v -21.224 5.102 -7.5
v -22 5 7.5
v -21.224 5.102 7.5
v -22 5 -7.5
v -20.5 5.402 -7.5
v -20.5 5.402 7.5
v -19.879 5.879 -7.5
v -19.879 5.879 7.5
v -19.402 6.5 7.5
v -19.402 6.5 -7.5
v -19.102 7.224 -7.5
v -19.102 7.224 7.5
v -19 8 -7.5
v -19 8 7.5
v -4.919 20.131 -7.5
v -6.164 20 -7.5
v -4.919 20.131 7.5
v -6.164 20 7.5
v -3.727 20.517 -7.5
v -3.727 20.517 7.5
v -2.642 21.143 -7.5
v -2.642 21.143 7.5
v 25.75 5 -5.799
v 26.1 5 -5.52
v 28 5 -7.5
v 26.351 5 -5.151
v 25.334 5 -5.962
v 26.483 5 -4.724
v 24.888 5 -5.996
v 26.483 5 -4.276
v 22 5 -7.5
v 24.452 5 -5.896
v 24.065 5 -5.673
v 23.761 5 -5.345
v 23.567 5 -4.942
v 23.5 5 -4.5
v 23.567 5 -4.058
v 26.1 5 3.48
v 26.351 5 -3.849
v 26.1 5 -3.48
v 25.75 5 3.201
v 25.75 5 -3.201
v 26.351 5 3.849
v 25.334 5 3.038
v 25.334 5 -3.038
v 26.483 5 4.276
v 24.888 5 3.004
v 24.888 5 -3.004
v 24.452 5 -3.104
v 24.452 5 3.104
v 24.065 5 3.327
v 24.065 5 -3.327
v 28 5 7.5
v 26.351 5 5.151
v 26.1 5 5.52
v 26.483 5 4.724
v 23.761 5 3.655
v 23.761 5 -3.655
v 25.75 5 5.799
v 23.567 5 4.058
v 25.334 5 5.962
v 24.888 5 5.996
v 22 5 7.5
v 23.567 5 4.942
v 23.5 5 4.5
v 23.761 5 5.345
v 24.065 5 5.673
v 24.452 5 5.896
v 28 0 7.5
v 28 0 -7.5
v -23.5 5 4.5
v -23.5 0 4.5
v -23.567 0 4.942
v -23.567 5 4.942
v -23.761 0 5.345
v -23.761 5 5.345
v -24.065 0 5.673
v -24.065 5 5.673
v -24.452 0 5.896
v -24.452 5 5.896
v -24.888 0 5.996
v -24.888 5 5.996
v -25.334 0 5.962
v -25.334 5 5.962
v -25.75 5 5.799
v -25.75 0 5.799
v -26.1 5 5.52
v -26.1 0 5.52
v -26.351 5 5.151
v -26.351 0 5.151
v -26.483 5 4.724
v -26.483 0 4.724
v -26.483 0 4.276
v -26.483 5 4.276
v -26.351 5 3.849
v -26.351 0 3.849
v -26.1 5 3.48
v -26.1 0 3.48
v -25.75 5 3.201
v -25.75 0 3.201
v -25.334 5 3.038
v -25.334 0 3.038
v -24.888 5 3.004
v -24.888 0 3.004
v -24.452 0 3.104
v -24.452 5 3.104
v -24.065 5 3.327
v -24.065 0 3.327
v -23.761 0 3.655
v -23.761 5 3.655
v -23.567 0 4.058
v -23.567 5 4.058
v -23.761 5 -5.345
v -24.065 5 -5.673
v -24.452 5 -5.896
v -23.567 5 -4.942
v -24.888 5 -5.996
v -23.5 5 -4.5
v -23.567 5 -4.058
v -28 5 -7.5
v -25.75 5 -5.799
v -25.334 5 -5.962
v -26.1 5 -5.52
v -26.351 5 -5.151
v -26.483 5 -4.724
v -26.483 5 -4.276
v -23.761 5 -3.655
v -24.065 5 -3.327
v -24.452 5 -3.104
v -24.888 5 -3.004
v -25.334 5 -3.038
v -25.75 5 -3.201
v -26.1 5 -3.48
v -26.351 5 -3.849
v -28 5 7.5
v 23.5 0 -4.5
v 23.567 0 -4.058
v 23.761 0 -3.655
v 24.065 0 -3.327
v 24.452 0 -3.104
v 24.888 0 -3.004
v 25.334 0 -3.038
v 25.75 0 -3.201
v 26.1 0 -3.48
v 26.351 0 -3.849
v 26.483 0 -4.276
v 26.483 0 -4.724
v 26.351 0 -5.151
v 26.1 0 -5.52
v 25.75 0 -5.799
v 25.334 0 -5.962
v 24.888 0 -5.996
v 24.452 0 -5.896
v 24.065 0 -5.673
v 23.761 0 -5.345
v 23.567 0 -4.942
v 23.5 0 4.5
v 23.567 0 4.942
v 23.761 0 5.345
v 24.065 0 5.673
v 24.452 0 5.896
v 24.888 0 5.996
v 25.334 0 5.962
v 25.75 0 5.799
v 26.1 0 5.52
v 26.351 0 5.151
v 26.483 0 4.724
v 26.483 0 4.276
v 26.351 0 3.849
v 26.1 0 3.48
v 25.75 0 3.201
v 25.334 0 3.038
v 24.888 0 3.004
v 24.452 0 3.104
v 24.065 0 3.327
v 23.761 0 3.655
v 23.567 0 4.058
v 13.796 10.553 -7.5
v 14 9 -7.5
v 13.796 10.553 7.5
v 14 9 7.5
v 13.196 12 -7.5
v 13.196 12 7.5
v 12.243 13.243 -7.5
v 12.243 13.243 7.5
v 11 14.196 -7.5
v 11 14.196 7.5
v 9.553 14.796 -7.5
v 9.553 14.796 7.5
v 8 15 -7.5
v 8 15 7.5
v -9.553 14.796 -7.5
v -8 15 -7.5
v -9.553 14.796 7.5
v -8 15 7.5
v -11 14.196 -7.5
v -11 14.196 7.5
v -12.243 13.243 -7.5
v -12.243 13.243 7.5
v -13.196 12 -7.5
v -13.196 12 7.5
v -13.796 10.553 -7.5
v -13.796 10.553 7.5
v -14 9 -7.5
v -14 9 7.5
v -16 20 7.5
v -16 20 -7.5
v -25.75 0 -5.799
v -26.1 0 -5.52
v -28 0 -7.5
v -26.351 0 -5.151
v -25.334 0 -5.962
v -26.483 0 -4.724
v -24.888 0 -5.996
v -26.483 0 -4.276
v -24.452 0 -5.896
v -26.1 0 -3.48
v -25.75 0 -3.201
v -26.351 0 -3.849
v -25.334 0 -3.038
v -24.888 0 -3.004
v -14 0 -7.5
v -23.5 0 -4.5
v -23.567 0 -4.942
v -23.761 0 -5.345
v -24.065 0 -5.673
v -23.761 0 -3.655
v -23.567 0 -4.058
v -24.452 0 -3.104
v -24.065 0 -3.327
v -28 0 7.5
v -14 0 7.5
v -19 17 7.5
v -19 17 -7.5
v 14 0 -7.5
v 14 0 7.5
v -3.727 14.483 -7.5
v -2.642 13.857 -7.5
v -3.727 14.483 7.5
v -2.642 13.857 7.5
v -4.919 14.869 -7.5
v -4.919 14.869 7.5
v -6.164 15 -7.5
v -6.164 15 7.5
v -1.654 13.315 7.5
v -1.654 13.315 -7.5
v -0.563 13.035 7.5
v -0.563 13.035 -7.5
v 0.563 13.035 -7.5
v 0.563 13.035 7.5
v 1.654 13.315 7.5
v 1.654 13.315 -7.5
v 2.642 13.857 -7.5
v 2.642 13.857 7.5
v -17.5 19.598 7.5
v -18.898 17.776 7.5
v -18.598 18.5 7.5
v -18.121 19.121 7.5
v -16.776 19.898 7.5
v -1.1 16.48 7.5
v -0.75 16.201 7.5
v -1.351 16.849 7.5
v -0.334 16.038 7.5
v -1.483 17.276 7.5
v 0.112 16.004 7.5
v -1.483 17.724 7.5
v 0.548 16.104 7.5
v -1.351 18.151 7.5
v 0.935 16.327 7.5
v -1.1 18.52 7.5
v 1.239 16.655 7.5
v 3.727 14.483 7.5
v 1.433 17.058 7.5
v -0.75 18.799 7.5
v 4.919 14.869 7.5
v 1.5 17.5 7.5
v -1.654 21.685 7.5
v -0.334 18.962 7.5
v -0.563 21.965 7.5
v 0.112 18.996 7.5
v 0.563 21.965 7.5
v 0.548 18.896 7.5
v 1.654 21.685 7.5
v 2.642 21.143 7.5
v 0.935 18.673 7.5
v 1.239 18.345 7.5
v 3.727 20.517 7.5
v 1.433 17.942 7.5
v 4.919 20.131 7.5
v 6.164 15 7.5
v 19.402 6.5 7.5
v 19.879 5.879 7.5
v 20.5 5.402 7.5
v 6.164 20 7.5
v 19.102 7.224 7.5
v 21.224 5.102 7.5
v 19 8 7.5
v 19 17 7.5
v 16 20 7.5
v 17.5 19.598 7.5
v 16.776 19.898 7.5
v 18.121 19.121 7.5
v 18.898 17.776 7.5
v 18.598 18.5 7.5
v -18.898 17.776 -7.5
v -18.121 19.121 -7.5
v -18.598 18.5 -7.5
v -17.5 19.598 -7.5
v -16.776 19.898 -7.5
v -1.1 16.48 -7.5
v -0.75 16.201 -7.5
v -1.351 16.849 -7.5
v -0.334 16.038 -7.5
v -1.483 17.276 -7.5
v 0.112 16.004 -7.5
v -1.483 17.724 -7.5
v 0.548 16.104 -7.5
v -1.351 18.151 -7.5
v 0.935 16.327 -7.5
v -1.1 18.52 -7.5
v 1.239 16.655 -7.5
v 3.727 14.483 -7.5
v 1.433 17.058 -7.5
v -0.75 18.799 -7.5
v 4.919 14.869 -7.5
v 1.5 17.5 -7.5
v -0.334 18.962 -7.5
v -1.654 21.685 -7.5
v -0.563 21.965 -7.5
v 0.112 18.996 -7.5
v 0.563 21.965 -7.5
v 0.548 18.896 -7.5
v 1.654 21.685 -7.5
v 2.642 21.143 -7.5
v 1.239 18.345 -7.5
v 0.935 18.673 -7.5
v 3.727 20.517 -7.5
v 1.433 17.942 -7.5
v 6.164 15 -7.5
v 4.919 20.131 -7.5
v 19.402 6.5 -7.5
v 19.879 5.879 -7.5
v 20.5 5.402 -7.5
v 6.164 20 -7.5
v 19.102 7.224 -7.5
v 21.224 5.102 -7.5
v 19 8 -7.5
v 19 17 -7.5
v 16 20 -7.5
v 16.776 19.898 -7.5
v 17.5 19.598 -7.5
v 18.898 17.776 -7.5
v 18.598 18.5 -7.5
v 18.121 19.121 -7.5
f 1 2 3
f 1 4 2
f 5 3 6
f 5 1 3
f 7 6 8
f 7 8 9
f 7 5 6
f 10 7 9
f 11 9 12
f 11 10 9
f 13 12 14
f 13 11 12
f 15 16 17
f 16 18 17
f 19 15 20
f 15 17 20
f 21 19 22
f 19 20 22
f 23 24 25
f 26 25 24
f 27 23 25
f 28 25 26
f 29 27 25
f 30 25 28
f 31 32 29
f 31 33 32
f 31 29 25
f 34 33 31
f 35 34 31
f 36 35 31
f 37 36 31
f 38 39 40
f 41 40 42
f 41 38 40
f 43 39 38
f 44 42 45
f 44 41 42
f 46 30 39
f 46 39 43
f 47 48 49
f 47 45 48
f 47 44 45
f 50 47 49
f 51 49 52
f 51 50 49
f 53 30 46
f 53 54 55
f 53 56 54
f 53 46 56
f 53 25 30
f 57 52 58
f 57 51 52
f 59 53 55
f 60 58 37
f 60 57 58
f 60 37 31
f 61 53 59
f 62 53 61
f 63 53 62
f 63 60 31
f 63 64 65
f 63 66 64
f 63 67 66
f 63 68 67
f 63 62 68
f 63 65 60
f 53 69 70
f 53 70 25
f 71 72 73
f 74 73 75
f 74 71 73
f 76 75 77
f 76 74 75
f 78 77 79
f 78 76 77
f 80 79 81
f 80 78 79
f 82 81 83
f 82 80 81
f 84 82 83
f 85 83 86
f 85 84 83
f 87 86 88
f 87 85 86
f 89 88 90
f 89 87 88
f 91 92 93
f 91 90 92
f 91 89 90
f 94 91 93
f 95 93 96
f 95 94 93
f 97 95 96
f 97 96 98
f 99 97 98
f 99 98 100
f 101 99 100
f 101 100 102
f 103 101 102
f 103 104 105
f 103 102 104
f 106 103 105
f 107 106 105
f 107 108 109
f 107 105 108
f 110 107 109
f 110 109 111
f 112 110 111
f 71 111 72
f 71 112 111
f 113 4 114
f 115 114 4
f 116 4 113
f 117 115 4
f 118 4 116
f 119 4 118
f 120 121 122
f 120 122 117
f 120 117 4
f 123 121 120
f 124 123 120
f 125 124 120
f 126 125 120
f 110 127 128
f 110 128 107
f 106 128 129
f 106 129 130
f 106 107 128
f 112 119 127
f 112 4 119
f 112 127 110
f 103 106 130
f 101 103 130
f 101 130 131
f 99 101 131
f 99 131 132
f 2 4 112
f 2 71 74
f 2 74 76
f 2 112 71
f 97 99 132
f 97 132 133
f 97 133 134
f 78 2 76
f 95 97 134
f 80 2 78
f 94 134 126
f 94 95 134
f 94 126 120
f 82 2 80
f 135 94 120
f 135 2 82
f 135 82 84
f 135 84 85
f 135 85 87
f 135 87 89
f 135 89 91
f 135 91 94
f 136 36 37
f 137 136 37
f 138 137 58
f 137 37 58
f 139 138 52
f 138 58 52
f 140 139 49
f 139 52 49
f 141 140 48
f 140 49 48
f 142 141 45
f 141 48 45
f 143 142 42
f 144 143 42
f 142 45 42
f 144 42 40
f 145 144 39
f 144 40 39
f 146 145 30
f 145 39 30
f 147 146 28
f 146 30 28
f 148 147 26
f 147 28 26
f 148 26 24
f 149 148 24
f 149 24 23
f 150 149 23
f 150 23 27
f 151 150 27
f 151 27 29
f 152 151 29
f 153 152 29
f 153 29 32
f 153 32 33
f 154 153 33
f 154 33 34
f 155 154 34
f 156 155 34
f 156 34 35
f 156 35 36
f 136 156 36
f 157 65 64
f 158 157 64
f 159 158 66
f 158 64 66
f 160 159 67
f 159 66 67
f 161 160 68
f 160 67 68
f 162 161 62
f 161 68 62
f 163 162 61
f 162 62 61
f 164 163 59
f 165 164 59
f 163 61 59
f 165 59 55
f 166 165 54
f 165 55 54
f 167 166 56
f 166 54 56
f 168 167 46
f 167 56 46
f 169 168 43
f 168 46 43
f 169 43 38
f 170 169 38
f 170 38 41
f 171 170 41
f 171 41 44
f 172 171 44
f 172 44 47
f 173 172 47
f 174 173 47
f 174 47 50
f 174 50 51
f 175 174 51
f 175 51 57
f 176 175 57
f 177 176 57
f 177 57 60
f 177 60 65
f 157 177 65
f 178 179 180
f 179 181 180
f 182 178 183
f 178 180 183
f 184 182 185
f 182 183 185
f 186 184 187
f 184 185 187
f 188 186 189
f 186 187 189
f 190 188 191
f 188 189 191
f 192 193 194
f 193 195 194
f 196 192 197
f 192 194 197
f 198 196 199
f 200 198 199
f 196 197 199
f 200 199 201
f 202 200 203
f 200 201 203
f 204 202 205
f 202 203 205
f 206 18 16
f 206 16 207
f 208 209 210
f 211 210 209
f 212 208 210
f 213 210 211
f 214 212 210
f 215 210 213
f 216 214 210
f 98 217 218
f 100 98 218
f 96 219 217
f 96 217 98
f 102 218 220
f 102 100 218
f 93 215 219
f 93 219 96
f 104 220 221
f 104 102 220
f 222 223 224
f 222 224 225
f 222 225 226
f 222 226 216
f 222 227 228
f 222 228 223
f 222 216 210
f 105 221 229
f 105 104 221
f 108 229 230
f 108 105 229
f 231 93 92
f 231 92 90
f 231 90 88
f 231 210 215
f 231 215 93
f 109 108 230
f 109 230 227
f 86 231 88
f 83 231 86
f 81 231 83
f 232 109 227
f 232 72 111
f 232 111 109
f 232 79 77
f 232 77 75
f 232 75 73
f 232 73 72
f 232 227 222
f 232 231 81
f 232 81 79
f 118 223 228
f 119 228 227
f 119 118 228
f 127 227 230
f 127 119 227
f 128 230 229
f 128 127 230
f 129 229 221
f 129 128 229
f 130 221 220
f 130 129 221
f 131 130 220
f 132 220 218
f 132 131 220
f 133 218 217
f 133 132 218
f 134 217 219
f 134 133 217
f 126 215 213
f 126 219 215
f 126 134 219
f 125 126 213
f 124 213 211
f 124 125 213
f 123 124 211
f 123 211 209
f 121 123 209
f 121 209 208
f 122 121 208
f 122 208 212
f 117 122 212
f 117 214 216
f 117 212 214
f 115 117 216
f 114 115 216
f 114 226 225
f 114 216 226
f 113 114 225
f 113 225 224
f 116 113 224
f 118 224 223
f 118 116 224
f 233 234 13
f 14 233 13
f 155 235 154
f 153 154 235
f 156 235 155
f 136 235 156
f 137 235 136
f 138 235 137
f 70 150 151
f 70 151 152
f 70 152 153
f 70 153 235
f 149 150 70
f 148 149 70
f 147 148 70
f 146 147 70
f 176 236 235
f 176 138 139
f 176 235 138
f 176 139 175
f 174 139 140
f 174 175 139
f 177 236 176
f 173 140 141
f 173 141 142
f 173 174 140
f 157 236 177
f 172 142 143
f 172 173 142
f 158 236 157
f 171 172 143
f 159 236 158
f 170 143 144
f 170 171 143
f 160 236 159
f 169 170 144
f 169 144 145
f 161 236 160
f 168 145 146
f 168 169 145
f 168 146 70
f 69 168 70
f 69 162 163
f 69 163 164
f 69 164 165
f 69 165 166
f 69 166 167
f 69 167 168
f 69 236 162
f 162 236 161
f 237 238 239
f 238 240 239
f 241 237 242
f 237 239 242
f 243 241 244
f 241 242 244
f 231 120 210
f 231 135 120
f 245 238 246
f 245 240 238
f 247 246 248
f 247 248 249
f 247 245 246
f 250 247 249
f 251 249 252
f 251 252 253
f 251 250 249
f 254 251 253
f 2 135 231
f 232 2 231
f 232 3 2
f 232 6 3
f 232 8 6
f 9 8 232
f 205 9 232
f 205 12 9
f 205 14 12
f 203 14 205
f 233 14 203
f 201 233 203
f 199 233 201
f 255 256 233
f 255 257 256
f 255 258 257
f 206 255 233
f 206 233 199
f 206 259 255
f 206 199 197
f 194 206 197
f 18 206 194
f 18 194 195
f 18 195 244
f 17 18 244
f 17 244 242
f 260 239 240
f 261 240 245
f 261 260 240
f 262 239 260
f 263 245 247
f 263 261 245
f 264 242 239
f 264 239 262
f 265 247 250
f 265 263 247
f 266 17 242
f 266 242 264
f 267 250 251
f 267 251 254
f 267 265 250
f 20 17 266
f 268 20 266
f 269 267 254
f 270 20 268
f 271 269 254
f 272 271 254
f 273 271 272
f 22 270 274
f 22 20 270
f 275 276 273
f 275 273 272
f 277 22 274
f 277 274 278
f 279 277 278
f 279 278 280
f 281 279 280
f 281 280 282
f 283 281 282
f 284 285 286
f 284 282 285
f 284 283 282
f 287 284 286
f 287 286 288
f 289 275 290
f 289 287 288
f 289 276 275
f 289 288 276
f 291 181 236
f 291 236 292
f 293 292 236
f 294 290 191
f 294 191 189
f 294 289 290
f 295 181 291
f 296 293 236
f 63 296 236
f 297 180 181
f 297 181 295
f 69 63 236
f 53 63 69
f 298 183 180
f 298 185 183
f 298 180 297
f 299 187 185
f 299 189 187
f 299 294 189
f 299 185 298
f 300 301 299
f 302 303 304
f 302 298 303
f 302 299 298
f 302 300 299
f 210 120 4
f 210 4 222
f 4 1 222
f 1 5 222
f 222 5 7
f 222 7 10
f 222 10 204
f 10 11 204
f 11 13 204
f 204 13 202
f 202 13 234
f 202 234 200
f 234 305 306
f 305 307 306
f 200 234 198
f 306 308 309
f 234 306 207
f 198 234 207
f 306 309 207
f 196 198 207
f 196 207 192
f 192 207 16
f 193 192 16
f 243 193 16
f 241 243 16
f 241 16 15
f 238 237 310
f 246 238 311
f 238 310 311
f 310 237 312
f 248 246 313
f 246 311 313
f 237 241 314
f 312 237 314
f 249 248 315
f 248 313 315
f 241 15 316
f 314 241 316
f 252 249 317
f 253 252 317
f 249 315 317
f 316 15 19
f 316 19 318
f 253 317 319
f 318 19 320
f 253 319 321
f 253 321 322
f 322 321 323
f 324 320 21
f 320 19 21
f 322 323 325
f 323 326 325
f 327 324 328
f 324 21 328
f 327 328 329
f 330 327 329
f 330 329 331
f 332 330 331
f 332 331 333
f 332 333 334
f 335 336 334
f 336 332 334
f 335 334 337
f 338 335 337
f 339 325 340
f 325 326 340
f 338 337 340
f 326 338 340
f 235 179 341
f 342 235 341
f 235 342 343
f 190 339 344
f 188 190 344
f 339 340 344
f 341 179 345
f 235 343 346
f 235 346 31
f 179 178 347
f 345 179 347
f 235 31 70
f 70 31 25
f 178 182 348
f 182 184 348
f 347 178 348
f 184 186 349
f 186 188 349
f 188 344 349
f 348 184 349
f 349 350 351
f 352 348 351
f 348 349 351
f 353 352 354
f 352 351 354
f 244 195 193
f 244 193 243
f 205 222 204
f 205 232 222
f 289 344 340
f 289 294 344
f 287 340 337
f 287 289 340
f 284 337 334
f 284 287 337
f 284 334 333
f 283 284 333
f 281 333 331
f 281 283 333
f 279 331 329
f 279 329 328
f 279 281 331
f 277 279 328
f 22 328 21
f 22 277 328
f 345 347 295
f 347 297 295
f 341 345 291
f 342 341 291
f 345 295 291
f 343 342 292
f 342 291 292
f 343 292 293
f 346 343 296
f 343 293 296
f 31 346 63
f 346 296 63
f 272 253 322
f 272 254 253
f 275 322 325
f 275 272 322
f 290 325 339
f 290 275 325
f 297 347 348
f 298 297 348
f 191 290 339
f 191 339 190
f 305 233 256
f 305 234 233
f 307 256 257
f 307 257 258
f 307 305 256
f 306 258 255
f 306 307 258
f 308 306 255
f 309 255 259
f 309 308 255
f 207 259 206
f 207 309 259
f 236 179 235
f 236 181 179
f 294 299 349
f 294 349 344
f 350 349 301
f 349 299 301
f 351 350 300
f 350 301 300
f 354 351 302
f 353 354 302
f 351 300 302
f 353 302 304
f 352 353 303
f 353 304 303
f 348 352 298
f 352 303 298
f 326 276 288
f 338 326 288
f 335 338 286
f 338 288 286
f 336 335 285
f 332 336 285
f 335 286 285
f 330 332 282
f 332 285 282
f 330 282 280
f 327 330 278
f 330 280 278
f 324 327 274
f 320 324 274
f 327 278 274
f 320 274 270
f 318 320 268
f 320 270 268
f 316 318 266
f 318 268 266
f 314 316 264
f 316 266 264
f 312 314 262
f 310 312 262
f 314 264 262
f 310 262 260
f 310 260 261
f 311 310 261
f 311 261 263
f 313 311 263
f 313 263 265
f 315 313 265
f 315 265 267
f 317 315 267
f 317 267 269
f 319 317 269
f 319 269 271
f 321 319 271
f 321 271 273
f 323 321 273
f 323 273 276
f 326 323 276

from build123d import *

# Parameters (mm, degrees)
EXTRUDE_1_DEPTH     = 7.5
FILLET_1_R          = 3
FILLET_3_R          = 6
SKETCH_2_R          = 1.5
CUT_EXTRUDE_1_DEPTH = 10
SKETCH_5_R          = 4.5
EXTRUDE_2_DEPTH     = 15
SKETCH_4_R          = 1.5
CUT_EXTRUDE_3_DEPTH = 39.639358173
FILLET_2_R          = 6


with BuildPart() as part:
    # 草图1 → 凸台-拉伸1 (new, symmetric)
    with BuildSketch(Plane.XY):
        Polygon((-28, 5), (-28, 0), (-14, 0), (-14, 15), (0, 15), (0, 20), (-19, 20), (-19, 5), align=None)
        Polygon((0, 20), (0, 15), (14, 15), (14, 0), (28, 0), (28, 5), (19, 5), (19, 20), align=None)
    extrude(amount=EXTRUDE_1_DEPTH, both=True)

    # 圆角1
    fillet_1_edges = [part.edges().sort_by_distance(p)[0] for p in [
        (-19, 5, 0),
        (-19, 20, 0),
        (19, 20, 0),
        (19, 5, 0),
    ]]
    fillet(fillet_1_edges, radius=FILLET_1_R)

    # 圆角3
    fillet_3_edges = [part.edges().sort_by_distance(p)[0] for p in [
        (-14, 15, 0),
        (14, 15, 0),
    ]]
    fillet(fillet_3_edges, radius=FILLET_3_R)

    # 草图2 → 切除-拉伸1 (cut)
    with BuildSketch(Plane(origin=(0, 5, 0), x_dir=(1, 0, 0), z_dir=(0, 1, 0))):
        with Locations(Location((25, -4.5, 0), (0, 0, 180))):
            Circle(SKETCH_2_R)
        with Locations(Location((25, 4.5, 0), (0, 0, 180))):
            Circle(SKETCH_2_R)
    cut_extrude_1 = extrude(amount=-CUT_EXTRUDE_1_DEPTH, mode=Mode.SUBTRACT)

    # 草图5 → 凸台-拉伸2 (add)
    with BuildSketch(Plane.XY.offset(7.5)):
        with Locations((0, 17.5)):
            Circle(SKETCH_5_R)
    extrude(amount=-EXTRUDE_2_DEPTH)

    # 草图4 → 切除-拉伸3 (cut, through all)
    with BuildSketch(Plane.XY.offset(7.5)):
        with Locations((0, 17.5)):
            Circle(SKETCH_4_R)
    extrude(amount=-CUT_EXTRUDE_3_DEPTH, mode=Mode.SUBTRACT)

    # 镜向2: 切除-拉伸1 across plane
    add(cut_extrude_1.mirror(Plane(origin=(0, 0, 0), x_dir=(0, 0, 1), z_dir=(1, 0, 0))), mode=Mode.SUBTRACT)

    # 圆角2
    fillet_2_edges = [part.edges().sort_by_distance(p)[0] for p in [
        (-3.741657387, 15, 0),
        (-3.741657387, 20, 0),
        (3.741657387, 15, 0),
        (3.741657387, 20, 0),
    ]]
    fillet(fillet_2_edges, radius=FILLET_2_R)


solid = part.part
